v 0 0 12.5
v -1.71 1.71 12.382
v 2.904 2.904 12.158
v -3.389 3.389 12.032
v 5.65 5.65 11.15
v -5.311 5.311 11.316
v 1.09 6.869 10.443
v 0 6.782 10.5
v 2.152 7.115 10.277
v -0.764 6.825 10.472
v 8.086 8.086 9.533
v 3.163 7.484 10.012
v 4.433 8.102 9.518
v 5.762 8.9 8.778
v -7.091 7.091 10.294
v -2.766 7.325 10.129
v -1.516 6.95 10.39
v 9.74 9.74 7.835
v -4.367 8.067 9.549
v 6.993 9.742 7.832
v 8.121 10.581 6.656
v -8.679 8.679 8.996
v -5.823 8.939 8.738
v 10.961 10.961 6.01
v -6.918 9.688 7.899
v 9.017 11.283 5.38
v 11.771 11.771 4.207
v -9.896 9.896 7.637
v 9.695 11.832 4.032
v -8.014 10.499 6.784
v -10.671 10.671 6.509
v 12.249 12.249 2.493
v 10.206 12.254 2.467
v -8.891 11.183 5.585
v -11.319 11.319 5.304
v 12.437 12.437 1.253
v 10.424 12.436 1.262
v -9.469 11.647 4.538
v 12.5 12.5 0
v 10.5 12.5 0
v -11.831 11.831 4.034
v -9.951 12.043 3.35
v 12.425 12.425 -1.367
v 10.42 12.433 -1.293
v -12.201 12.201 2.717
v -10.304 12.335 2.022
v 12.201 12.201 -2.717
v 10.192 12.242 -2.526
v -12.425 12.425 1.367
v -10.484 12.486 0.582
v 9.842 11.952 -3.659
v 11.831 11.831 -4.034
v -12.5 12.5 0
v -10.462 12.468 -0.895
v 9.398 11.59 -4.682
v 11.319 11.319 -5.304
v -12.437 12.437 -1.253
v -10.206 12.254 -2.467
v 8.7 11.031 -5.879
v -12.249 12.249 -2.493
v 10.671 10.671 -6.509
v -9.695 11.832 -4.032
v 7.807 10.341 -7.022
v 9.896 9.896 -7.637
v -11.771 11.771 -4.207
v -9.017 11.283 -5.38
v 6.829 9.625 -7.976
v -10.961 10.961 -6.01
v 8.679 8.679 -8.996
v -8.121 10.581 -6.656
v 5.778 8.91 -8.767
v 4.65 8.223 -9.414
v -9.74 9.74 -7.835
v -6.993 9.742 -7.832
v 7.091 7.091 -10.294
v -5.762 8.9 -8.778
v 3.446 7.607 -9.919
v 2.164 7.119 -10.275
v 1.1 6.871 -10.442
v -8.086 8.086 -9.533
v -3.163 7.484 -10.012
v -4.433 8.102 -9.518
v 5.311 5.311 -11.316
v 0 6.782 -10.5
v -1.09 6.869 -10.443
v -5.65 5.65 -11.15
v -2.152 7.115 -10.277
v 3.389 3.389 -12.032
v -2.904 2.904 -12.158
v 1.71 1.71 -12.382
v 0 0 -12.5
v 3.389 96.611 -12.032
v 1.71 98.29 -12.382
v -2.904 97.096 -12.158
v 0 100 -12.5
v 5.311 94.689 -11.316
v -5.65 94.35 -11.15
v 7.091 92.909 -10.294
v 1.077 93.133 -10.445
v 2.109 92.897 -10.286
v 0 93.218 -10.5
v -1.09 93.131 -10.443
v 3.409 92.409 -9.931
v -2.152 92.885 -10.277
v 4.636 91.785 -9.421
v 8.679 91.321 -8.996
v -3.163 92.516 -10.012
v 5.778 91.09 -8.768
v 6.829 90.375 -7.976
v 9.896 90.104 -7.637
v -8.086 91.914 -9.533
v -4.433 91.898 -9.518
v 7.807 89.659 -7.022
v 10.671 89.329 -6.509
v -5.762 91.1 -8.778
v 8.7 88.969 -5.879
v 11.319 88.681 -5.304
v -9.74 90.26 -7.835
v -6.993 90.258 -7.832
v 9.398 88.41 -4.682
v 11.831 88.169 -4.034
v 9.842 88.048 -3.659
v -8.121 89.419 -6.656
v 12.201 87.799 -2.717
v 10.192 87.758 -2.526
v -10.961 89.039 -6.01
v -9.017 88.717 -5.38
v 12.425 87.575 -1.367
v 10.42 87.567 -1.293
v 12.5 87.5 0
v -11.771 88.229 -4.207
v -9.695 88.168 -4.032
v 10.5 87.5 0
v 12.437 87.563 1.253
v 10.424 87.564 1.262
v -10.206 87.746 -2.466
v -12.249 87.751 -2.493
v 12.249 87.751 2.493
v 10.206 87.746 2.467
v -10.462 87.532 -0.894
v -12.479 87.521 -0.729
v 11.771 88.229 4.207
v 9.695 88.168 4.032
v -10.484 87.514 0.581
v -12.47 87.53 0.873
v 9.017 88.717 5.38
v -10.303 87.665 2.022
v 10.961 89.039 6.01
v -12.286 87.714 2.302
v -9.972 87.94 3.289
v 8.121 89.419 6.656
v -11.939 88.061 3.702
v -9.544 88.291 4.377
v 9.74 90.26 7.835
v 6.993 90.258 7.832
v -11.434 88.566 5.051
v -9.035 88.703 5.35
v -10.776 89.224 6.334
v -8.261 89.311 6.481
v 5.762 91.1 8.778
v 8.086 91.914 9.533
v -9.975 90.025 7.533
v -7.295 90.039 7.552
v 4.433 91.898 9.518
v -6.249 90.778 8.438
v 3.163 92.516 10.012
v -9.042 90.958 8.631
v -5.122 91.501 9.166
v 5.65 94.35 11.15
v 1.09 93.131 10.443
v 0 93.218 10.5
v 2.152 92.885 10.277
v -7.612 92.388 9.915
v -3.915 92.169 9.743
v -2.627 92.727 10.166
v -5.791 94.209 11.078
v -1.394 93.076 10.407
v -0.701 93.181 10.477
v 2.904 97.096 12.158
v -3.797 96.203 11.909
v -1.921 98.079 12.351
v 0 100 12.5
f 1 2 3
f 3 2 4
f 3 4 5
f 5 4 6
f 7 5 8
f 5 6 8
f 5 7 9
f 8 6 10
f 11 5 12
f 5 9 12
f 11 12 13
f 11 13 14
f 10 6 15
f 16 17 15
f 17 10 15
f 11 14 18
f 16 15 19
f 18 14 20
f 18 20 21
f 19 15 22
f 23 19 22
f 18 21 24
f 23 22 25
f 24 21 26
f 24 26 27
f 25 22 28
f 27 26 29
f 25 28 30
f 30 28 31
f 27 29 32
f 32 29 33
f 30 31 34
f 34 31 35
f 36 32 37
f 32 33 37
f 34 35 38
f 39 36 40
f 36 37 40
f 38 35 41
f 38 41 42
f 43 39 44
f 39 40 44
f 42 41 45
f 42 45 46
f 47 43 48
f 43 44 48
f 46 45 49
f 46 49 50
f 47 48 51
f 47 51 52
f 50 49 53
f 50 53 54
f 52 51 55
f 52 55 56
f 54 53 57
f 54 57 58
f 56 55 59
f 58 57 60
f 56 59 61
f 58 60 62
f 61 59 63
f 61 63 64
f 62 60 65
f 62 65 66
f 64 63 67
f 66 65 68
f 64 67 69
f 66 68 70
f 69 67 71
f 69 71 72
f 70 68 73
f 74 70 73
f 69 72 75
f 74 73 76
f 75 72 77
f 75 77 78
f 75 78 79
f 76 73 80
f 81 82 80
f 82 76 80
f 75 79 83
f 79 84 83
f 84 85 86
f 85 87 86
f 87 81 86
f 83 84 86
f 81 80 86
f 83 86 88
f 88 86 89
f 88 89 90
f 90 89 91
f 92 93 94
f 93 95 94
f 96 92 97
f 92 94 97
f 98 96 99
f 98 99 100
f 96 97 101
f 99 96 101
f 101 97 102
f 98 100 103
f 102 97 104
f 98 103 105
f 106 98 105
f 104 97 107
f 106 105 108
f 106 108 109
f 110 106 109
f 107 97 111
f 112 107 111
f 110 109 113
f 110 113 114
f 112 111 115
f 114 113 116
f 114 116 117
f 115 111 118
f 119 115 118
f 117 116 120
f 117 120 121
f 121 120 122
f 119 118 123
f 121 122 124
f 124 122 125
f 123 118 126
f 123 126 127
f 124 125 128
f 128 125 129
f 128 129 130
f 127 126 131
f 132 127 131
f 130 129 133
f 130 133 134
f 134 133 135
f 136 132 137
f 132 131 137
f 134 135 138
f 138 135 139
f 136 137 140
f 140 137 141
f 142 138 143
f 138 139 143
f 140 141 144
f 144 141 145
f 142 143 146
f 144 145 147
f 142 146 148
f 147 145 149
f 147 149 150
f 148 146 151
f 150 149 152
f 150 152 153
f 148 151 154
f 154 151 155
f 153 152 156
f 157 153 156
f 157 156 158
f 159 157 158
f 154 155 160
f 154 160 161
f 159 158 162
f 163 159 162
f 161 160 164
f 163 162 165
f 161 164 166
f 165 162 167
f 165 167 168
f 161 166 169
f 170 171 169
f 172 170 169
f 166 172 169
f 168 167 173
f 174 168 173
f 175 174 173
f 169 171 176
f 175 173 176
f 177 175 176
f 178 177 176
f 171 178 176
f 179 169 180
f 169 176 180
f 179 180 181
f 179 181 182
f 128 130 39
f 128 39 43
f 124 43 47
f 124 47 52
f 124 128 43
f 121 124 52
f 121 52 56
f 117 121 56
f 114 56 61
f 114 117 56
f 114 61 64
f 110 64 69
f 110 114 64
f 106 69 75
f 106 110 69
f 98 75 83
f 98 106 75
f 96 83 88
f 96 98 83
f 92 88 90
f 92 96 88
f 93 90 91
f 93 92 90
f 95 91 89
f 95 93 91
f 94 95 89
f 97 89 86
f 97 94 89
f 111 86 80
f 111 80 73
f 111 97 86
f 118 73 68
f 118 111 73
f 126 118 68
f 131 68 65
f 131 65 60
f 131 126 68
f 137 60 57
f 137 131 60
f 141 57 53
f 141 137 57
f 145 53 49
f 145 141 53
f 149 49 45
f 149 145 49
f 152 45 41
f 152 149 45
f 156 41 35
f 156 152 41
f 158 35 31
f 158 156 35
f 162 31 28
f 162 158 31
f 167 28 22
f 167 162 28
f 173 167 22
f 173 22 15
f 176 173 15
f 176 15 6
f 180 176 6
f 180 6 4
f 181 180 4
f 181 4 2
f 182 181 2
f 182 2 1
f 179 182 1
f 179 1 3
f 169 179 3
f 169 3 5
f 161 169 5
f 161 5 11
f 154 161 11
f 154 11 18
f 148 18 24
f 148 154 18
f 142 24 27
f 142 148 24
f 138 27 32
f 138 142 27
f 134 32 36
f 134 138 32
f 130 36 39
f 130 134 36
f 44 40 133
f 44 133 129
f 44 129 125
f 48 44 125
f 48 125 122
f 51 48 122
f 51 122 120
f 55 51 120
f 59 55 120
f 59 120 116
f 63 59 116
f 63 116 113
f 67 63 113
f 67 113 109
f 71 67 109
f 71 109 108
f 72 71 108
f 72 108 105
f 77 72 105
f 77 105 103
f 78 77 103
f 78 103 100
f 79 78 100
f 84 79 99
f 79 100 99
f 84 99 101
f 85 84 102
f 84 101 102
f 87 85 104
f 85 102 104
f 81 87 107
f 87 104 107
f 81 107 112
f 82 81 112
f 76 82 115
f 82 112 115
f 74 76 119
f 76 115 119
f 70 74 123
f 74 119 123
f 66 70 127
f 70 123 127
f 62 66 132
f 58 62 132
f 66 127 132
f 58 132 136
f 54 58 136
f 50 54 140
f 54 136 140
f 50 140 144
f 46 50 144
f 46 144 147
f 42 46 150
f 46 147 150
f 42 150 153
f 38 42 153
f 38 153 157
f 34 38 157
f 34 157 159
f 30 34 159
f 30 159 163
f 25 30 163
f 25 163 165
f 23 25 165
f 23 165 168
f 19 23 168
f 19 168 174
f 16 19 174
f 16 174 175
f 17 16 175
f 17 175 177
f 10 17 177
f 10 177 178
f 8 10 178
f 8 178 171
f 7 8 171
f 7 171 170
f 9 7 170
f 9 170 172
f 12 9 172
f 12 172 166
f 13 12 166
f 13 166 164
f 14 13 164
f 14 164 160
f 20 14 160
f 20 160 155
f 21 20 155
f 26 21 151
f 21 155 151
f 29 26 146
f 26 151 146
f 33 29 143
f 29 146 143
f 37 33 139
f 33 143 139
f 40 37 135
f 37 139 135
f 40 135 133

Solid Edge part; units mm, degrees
sketch "Sketch1" plane through (0, 0, 0) normal (0, 0, 1) x (1, 0, 0)
  line L0 (0, 0) -> (0, 100)
  dimension "D1" = 100
sketch "Sketch2" plane through (0, 0, 0) normal (0, -1, 0) x (1, 0, 0)
  circle A0 centre (0, 0) radius 12.5
sweep "SweptProtrusion_1" add profiles "Sketch2" path "Sketch1"
shell "Thinwall_1" thickness 2 removed faces 2 at (-8.0833, 0, 8.5833) at (-8.0833, 100, 8.5833)
sketch "Sketch3" plane through (0, 0, 0) normal (1, 0, 0) x (0, 1, 0)
  circle A0 centre (0, 0) radius 12.5
  circle A1 centre (100, 0) radius 12.5
extrude "Cutout1" cut sketch "Sketch3" along normal through all and the other way through all
properties material "Stainless steel"
